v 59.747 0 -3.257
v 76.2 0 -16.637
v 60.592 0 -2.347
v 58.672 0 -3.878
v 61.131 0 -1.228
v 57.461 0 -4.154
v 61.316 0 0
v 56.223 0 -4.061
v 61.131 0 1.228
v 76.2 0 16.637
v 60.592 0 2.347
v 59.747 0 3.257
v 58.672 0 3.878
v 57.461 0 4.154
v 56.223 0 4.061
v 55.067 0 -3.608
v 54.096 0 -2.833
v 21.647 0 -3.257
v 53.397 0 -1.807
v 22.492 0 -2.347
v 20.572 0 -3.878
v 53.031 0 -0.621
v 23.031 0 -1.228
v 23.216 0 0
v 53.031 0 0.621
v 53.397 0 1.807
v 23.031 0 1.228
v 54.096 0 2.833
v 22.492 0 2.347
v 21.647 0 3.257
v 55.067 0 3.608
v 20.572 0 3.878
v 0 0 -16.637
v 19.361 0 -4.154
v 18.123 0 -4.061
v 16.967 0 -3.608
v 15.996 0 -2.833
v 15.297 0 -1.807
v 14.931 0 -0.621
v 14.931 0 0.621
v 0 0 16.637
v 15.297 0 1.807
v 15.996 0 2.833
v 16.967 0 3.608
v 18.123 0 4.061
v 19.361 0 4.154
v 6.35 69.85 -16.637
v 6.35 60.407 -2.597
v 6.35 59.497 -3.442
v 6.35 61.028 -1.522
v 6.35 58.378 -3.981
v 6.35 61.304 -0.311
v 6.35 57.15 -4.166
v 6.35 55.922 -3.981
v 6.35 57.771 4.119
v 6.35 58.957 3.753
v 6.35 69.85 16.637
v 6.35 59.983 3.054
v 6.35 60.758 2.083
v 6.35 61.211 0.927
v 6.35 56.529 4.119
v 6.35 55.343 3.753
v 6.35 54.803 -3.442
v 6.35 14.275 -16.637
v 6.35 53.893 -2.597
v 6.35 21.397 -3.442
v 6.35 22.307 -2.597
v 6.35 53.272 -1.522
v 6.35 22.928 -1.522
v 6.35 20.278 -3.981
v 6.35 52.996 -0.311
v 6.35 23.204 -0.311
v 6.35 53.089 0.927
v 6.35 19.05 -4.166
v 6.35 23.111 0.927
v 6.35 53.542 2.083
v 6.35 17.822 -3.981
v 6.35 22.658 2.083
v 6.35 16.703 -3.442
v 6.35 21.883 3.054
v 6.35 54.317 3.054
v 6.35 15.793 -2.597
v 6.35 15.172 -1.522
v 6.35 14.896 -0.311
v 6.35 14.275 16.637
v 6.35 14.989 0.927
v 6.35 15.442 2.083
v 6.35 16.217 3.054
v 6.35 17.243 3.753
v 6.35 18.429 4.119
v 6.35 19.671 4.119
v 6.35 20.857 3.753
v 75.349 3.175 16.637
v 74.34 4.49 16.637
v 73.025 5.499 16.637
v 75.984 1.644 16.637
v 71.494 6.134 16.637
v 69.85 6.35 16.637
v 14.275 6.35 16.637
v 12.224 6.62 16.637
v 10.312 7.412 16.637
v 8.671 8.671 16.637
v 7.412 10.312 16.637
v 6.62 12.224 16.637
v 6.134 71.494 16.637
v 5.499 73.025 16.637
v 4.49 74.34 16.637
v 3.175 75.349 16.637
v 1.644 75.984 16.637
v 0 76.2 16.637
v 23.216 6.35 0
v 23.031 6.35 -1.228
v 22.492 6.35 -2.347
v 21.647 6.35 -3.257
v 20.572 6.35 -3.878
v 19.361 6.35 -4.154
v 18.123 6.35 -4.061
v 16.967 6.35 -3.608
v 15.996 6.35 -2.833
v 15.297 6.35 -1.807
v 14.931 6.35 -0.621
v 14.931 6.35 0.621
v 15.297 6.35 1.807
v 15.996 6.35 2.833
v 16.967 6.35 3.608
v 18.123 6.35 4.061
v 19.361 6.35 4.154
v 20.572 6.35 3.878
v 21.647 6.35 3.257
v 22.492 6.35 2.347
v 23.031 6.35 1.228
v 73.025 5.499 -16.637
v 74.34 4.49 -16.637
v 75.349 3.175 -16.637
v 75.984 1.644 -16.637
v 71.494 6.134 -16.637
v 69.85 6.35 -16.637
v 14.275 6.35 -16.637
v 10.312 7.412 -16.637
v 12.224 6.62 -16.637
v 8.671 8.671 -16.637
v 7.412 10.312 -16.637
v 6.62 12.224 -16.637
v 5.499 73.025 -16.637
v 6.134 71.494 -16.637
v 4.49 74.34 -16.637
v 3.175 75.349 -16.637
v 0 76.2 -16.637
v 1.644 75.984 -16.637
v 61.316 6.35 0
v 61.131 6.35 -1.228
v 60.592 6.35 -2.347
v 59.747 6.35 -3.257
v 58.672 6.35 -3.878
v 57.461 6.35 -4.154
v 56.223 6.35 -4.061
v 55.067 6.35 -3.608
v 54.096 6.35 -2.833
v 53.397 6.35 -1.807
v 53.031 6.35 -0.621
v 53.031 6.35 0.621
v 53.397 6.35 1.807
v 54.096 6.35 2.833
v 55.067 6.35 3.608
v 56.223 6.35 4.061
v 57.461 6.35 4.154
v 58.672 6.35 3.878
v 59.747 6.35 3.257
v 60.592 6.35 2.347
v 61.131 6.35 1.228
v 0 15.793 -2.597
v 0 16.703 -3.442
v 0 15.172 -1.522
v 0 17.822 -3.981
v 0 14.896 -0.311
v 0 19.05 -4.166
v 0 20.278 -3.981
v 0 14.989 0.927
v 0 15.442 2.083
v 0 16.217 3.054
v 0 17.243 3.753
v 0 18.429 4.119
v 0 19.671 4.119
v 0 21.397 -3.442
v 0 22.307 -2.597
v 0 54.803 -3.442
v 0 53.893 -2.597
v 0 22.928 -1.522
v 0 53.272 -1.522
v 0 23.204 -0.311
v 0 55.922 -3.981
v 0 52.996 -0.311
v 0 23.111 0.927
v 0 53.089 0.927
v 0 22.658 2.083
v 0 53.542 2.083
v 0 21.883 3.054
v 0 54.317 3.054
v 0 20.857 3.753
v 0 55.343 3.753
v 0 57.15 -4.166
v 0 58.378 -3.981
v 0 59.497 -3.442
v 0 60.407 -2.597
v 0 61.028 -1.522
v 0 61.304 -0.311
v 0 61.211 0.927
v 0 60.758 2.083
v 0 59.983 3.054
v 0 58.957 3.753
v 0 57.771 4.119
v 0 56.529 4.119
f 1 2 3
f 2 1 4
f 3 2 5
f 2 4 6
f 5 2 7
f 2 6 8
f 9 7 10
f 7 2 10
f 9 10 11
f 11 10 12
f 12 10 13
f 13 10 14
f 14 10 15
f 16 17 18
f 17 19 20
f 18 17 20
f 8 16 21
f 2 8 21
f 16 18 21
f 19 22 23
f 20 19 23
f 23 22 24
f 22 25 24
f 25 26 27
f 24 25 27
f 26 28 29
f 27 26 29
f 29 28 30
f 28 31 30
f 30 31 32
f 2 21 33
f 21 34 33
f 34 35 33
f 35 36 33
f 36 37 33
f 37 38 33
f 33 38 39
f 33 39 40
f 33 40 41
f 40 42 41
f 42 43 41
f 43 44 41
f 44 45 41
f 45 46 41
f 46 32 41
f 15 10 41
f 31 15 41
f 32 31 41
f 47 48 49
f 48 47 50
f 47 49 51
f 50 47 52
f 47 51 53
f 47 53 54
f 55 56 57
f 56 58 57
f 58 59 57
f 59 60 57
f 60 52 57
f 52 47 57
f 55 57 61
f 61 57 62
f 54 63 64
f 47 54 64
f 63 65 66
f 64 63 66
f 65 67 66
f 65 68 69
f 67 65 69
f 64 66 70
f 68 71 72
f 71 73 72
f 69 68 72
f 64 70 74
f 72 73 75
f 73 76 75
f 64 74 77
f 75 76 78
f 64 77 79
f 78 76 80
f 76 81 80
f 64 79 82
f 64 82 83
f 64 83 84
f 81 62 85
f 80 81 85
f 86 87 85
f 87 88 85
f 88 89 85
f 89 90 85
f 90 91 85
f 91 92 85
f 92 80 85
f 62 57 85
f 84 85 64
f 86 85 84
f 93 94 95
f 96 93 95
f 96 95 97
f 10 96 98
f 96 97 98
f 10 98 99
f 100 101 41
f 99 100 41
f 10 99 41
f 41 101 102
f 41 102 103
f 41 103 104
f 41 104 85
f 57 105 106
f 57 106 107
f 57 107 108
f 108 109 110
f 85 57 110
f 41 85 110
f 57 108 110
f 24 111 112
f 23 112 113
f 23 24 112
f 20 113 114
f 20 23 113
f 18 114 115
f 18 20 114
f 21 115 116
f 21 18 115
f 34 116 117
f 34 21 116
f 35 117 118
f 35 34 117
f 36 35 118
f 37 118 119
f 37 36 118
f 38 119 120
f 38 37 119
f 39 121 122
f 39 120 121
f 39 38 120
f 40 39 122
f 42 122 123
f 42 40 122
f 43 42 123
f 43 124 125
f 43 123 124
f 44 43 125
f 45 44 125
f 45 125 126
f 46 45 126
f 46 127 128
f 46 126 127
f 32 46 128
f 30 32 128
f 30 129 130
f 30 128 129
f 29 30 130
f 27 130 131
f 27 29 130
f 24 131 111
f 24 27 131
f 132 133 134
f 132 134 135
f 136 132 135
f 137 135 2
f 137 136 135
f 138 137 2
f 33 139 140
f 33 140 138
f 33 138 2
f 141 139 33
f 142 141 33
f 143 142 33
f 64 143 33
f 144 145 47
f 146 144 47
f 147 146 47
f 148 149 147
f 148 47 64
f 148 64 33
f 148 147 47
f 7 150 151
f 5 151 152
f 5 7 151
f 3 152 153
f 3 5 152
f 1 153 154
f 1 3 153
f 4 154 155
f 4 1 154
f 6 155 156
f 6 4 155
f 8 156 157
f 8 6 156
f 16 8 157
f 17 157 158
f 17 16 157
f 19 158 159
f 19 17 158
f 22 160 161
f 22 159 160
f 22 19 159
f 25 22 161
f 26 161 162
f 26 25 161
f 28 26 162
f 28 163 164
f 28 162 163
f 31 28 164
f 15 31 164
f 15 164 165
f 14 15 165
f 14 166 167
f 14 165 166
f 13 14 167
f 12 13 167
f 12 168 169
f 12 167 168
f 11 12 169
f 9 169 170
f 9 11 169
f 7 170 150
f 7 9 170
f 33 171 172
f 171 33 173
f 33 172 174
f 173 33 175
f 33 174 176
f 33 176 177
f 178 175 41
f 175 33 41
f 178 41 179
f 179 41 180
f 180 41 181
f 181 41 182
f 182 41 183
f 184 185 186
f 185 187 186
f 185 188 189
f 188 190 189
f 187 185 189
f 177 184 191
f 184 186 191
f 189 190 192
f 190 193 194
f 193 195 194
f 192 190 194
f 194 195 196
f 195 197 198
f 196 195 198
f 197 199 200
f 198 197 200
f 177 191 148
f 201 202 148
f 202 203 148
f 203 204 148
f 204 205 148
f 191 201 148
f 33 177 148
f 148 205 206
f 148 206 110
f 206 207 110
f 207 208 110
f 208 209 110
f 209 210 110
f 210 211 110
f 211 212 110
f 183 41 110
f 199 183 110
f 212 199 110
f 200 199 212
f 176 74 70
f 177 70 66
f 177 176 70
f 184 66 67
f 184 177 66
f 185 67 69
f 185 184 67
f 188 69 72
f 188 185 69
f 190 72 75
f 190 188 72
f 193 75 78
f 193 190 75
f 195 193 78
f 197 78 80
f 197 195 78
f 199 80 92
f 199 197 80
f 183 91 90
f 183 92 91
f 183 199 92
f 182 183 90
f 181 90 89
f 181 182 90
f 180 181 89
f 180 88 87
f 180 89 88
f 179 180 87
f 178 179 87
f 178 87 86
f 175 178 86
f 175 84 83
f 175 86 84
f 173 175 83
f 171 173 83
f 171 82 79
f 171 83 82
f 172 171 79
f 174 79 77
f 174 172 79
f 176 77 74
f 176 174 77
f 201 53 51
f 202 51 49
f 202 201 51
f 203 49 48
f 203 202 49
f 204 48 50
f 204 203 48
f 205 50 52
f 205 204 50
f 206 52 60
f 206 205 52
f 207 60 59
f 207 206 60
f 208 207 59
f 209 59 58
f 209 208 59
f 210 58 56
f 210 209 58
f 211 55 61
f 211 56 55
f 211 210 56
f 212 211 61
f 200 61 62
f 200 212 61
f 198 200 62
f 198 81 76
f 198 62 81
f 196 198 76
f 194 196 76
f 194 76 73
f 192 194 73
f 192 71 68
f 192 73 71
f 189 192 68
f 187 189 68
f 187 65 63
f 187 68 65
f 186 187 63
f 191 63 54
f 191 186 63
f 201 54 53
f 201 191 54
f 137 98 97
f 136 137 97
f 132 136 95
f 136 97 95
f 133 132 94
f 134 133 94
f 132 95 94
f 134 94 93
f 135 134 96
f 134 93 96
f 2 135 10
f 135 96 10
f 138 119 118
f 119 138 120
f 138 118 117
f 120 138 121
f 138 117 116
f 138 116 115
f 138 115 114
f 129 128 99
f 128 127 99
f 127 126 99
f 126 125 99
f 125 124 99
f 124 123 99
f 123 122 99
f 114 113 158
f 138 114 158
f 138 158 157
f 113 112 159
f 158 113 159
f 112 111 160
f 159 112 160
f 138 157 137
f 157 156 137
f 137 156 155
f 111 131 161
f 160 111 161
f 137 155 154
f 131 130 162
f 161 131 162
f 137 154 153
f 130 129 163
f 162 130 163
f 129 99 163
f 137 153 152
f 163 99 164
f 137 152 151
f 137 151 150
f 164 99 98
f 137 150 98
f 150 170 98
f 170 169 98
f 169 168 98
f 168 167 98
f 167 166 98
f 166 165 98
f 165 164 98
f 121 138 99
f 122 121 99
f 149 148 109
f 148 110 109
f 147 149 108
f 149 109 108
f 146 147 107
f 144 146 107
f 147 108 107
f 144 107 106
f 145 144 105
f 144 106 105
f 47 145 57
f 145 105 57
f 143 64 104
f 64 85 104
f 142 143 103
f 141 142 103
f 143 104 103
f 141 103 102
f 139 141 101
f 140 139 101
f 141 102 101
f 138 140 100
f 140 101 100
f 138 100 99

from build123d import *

# Parameters (mm, degrees)
BOSS_EXTRUDE1_DEPTH = 16.637
SKETCH2_R           = 4.1656
CUT_EXTRUDE1_DEPTH  = 77.2
SKETCH3_R           = 4.1656
CUT_EXTRUDE2_DEPTH  = 77.2


with BuildPart() as part:
    # Sketch1 → Boss-Extrude1 (new body, symmetric)
    with BuildSketch(Plane.XY):
        with BuildLine():
            Line((0, 0), (0, 76.2))
            ThreePointArc((0, 76.2), (4.490128061, 74.340128061), (6.35, 69.85))
            Line((6.35, 69.85), (6.35, 14.2748))
            ThreePointArc((6.35, 14.2748), (8.67112018, 8.67112018), (14.2748, 6.35))
            Line((14.2748, 6.35), (69.85, 6.35))
            ThreePointArc((69.85, 6.35), (74.340128061, 4.490128061), (76.2, 0))
            Line((76.2, 0), (0, 0))
        make_face()
    extrude(amount=BOSS_EXTRUDE1_DEPTH, both=True)

    # Sketch2 → Cut-Extrude1 (cut, through all)
    with BuildSketch(Plane(origin=(0, 0, 0), x_dir=(1, 0, 0), z_dir=(0, 1, 0))):
        with Locations((19.05, 0)):
            Circle(SKETCH2_R)
        with Locations((57.15, 0)):
            Circle(SKETCH2_R)
    extrude(amount=CUT_EXTRUDE1_DEPTH, mode=Mode.SUBTRACT)

    # Sketch3 → Cut-Extrude2 (cut, through all)
    with BuildSketch(Plane(origin=(0, 0, 0), x_dir=(0, 0, -1), z_dir=(1, 0, 0))):
        with Locations((0, 19.05)):
            Circle(SKETCH3_R)
        with Locations((0, 57.15)):
            Circle(SKETCH3_R)
    extrude(amount=CUT_EXTRUDE2_DEPTH, mode=Mode.SUBTRACT)


solid = part.part
